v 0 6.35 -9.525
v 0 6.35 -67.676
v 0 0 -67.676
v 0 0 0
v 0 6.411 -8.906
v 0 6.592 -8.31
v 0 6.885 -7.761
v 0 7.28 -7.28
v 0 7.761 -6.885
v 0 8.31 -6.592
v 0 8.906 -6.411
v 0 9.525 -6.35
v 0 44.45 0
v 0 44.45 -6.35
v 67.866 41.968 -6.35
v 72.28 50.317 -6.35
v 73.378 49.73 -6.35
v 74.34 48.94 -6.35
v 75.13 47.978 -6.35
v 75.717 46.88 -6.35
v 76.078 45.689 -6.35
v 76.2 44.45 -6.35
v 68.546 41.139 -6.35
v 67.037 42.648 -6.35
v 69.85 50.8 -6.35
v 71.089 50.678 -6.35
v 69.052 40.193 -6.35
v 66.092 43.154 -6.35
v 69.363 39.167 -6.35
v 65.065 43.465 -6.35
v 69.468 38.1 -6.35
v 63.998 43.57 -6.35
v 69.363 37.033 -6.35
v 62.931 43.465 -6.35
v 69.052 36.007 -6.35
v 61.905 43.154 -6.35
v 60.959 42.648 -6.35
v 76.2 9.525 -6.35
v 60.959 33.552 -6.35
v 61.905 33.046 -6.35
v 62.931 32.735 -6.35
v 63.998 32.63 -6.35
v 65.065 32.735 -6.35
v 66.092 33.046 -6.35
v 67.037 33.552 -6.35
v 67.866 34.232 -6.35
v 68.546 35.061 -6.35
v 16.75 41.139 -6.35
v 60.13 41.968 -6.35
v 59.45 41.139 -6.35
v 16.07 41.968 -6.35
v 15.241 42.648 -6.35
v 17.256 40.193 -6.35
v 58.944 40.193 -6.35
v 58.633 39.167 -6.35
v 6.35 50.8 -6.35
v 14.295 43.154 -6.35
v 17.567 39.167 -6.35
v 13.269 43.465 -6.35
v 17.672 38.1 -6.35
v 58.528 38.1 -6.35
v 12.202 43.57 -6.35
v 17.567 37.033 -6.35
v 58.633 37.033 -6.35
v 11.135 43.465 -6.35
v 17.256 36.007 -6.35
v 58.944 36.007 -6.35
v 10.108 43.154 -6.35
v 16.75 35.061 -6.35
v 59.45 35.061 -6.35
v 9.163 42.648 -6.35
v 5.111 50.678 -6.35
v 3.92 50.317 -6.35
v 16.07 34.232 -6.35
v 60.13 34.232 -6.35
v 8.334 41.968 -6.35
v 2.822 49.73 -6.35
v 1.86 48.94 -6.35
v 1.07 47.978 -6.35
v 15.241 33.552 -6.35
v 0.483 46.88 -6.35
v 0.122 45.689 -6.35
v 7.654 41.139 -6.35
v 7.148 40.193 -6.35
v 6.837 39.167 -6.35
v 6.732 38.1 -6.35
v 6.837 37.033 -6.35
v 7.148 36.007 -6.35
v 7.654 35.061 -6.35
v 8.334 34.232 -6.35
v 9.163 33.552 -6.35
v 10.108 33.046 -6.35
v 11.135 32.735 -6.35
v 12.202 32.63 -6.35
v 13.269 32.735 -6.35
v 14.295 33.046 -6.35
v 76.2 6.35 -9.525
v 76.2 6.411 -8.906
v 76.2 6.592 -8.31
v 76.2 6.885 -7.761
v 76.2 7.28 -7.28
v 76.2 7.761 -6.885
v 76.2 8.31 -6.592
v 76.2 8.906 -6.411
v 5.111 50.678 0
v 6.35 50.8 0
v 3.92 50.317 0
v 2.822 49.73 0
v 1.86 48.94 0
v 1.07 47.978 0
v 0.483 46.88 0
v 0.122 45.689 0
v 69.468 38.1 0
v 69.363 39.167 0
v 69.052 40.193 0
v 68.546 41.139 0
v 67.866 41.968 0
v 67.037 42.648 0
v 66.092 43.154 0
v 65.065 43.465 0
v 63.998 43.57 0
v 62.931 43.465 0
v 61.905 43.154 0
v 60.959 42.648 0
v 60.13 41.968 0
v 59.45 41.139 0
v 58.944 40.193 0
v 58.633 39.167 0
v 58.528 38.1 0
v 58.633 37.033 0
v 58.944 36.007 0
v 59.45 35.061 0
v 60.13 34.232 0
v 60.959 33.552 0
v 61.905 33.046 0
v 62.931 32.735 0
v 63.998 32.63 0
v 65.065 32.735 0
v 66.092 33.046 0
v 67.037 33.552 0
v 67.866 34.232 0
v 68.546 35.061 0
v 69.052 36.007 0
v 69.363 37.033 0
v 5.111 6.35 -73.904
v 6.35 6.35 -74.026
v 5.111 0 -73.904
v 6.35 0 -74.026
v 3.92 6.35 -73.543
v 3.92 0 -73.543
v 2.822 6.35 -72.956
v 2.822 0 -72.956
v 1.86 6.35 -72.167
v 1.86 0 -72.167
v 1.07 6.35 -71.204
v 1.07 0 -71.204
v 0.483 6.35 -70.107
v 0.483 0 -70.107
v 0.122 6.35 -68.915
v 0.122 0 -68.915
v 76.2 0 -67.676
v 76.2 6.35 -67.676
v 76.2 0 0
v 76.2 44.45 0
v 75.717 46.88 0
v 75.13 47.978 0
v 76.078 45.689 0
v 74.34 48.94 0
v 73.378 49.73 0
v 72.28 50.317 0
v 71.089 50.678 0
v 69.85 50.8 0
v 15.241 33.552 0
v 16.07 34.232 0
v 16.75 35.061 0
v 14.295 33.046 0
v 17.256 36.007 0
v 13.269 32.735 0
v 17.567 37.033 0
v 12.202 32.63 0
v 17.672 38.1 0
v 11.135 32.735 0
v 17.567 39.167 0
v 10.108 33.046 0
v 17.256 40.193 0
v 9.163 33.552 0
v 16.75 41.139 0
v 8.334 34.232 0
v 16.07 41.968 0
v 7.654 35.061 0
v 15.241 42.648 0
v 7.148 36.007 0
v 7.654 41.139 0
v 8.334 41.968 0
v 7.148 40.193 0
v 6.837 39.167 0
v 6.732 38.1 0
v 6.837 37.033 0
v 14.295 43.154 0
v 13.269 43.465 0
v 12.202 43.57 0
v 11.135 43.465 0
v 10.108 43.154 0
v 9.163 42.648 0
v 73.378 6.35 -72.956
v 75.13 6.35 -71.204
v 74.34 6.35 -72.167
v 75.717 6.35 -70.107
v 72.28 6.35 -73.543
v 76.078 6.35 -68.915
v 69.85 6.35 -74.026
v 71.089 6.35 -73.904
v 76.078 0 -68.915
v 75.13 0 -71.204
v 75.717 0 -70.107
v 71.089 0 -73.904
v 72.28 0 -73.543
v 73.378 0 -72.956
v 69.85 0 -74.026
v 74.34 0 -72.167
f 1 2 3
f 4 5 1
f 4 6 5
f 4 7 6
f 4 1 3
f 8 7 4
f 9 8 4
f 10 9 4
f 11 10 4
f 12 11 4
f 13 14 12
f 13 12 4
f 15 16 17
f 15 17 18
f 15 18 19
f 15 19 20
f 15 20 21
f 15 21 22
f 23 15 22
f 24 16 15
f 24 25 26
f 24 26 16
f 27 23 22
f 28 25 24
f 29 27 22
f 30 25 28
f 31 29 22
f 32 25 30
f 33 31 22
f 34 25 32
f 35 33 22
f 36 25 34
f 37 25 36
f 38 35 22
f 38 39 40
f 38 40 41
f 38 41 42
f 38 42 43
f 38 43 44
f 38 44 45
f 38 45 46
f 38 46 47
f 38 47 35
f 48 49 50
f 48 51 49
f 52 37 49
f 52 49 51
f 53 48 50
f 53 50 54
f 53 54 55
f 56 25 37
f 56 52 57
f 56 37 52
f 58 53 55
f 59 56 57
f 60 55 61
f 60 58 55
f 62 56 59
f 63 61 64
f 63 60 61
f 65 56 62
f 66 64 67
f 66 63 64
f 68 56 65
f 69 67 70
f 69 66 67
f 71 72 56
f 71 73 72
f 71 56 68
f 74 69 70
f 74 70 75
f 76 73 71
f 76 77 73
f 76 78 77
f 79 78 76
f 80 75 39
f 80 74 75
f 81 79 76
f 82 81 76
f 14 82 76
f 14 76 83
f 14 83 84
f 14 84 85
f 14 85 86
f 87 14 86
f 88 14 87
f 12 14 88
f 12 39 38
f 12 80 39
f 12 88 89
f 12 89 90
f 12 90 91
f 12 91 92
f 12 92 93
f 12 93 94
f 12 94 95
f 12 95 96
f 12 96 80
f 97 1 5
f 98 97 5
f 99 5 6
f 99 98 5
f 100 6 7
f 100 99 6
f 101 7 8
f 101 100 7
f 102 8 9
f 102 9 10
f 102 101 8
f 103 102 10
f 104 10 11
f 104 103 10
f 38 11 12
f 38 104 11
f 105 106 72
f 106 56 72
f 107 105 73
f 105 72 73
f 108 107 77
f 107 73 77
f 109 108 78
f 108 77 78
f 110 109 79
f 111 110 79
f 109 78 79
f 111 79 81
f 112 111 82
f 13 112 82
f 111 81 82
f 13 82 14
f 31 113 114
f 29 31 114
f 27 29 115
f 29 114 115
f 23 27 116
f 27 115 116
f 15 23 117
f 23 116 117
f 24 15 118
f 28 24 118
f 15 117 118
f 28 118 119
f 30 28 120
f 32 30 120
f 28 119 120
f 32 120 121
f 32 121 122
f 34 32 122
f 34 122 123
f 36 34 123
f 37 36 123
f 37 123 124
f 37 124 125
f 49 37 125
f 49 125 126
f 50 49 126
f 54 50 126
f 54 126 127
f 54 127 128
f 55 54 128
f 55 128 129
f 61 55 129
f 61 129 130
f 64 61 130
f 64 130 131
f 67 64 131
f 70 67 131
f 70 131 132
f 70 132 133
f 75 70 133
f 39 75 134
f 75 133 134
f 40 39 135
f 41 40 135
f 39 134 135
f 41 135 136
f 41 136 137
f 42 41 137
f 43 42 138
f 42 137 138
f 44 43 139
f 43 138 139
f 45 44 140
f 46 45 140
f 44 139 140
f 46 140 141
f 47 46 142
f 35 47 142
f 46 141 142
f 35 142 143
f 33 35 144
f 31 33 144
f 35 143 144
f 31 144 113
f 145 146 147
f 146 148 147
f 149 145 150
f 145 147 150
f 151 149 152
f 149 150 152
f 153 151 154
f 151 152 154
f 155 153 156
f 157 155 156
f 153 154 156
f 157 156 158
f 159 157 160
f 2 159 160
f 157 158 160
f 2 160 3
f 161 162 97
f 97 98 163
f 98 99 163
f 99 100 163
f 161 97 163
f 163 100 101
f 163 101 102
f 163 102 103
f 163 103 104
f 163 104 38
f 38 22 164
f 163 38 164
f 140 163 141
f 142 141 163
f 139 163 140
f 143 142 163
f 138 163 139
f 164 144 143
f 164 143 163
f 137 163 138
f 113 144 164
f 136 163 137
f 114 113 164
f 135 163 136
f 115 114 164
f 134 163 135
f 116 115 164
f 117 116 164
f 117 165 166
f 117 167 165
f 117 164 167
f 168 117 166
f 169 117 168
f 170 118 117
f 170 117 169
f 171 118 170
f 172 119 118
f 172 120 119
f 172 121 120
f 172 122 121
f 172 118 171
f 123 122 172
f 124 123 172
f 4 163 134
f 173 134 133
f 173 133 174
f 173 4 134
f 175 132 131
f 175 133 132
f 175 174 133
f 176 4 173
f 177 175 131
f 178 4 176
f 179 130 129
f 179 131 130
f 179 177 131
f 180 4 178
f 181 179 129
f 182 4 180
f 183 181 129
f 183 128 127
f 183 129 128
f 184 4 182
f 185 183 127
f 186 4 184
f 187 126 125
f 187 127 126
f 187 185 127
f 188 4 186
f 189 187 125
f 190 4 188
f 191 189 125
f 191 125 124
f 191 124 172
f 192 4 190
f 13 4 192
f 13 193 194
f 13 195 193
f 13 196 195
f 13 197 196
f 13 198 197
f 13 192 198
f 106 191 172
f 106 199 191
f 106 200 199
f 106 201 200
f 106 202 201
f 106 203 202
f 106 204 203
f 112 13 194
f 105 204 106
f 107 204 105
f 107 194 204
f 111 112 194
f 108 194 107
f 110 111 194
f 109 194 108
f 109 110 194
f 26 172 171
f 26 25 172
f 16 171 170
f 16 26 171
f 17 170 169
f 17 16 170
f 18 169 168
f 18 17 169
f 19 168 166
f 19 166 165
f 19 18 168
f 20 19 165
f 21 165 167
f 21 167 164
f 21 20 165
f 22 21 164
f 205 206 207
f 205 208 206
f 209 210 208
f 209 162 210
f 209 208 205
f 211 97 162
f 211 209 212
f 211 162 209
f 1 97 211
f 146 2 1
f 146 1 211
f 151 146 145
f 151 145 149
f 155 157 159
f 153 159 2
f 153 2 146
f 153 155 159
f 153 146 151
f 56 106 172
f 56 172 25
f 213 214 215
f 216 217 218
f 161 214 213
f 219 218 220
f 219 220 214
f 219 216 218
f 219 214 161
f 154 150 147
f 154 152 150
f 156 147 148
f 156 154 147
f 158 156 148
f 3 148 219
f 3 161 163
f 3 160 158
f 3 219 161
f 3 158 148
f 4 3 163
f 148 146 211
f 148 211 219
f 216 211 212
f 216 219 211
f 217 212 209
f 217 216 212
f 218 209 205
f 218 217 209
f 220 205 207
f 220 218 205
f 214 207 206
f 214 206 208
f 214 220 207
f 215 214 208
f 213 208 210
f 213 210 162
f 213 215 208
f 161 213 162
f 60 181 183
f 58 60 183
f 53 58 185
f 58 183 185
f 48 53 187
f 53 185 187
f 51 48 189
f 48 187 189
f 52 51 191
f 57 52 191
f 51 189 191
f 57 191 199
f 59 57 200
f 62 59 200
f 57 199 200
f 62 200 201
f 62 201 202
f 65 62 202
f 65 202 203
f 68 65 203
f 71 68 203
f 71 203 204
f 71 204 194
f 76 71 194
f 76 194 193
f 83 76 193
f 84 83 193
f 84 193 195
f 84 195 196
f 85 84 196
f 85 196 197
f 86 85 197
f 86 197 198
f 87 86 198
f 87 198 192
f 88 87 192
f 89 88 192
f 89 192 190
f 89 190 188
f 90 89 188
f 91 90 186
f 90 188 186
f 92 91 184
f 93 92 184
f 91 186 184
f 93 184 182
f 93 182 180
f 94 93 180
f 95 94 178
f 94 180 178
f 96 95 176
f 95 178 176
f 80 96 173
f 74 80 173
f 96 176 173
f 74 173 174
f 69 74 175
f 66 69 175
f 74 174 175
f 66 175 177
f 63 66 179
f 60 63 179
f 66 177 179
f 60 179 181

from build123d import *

# Parameters (mm, degrees)
EXTRUDE_THIN1_DEPTH = 76.2
FILLET1_R           = 6.35
SKETCH3_R           = 5.470235349
CUT_EXTRUDE2_DEPTH  = 76.2
FILLET2_R           = 3.175


with BuildPart() as part:
    # Sketch1 → Extrude-Thin1 (new body)
    with BuildSketch(Plane(origin=(0, 0, 0), x_dir=(0, 0, -1), z_dir=(1, 0, 0))):
        Polygon((74.026491926, 0), (0, 0), (0, 50.8), (6.35, 50.8), (6.35, 6.35), (74.026491926, 6.35), align=None)
    extrude(amount=EXTRUDE_THIN1_DEPTH)

    # Fillet1
    fillet1_edges = [part.edges().sort_by_distance(p)[0] for p in [
        (76.2, 3.175, -74.026491926),
        (0, 3.175, -74.026491926),
        (0, 50.8, -3.175),
        (76.2, 50.8, -3.175),
    ]]
    fillet(fillet1_edges, radius=FILLET1_R)

    # Sketch3 → Cut-Extrude2 (cut)
    with BuildSketch(Plane.XY):
        with Locations((12.201854518, 38.1)):
            Circle(SKETCH3_R)
        with Locations((63.998145482, 38.1)):
            Circle(SKETCH3_R)
    extrude(amount=-CUT_EXTRUDE2_DEPTH, mode=Mode.SUBTRACT)

    # Fillet2
    fillet2_edges = [part.edges().sort_by_distance(p)[0] for p in [
        (38.1, 6.35, -6.35),
    ]]
    fillet(fillet2_edges, radius=FILLET2_R)


solid = part.part
